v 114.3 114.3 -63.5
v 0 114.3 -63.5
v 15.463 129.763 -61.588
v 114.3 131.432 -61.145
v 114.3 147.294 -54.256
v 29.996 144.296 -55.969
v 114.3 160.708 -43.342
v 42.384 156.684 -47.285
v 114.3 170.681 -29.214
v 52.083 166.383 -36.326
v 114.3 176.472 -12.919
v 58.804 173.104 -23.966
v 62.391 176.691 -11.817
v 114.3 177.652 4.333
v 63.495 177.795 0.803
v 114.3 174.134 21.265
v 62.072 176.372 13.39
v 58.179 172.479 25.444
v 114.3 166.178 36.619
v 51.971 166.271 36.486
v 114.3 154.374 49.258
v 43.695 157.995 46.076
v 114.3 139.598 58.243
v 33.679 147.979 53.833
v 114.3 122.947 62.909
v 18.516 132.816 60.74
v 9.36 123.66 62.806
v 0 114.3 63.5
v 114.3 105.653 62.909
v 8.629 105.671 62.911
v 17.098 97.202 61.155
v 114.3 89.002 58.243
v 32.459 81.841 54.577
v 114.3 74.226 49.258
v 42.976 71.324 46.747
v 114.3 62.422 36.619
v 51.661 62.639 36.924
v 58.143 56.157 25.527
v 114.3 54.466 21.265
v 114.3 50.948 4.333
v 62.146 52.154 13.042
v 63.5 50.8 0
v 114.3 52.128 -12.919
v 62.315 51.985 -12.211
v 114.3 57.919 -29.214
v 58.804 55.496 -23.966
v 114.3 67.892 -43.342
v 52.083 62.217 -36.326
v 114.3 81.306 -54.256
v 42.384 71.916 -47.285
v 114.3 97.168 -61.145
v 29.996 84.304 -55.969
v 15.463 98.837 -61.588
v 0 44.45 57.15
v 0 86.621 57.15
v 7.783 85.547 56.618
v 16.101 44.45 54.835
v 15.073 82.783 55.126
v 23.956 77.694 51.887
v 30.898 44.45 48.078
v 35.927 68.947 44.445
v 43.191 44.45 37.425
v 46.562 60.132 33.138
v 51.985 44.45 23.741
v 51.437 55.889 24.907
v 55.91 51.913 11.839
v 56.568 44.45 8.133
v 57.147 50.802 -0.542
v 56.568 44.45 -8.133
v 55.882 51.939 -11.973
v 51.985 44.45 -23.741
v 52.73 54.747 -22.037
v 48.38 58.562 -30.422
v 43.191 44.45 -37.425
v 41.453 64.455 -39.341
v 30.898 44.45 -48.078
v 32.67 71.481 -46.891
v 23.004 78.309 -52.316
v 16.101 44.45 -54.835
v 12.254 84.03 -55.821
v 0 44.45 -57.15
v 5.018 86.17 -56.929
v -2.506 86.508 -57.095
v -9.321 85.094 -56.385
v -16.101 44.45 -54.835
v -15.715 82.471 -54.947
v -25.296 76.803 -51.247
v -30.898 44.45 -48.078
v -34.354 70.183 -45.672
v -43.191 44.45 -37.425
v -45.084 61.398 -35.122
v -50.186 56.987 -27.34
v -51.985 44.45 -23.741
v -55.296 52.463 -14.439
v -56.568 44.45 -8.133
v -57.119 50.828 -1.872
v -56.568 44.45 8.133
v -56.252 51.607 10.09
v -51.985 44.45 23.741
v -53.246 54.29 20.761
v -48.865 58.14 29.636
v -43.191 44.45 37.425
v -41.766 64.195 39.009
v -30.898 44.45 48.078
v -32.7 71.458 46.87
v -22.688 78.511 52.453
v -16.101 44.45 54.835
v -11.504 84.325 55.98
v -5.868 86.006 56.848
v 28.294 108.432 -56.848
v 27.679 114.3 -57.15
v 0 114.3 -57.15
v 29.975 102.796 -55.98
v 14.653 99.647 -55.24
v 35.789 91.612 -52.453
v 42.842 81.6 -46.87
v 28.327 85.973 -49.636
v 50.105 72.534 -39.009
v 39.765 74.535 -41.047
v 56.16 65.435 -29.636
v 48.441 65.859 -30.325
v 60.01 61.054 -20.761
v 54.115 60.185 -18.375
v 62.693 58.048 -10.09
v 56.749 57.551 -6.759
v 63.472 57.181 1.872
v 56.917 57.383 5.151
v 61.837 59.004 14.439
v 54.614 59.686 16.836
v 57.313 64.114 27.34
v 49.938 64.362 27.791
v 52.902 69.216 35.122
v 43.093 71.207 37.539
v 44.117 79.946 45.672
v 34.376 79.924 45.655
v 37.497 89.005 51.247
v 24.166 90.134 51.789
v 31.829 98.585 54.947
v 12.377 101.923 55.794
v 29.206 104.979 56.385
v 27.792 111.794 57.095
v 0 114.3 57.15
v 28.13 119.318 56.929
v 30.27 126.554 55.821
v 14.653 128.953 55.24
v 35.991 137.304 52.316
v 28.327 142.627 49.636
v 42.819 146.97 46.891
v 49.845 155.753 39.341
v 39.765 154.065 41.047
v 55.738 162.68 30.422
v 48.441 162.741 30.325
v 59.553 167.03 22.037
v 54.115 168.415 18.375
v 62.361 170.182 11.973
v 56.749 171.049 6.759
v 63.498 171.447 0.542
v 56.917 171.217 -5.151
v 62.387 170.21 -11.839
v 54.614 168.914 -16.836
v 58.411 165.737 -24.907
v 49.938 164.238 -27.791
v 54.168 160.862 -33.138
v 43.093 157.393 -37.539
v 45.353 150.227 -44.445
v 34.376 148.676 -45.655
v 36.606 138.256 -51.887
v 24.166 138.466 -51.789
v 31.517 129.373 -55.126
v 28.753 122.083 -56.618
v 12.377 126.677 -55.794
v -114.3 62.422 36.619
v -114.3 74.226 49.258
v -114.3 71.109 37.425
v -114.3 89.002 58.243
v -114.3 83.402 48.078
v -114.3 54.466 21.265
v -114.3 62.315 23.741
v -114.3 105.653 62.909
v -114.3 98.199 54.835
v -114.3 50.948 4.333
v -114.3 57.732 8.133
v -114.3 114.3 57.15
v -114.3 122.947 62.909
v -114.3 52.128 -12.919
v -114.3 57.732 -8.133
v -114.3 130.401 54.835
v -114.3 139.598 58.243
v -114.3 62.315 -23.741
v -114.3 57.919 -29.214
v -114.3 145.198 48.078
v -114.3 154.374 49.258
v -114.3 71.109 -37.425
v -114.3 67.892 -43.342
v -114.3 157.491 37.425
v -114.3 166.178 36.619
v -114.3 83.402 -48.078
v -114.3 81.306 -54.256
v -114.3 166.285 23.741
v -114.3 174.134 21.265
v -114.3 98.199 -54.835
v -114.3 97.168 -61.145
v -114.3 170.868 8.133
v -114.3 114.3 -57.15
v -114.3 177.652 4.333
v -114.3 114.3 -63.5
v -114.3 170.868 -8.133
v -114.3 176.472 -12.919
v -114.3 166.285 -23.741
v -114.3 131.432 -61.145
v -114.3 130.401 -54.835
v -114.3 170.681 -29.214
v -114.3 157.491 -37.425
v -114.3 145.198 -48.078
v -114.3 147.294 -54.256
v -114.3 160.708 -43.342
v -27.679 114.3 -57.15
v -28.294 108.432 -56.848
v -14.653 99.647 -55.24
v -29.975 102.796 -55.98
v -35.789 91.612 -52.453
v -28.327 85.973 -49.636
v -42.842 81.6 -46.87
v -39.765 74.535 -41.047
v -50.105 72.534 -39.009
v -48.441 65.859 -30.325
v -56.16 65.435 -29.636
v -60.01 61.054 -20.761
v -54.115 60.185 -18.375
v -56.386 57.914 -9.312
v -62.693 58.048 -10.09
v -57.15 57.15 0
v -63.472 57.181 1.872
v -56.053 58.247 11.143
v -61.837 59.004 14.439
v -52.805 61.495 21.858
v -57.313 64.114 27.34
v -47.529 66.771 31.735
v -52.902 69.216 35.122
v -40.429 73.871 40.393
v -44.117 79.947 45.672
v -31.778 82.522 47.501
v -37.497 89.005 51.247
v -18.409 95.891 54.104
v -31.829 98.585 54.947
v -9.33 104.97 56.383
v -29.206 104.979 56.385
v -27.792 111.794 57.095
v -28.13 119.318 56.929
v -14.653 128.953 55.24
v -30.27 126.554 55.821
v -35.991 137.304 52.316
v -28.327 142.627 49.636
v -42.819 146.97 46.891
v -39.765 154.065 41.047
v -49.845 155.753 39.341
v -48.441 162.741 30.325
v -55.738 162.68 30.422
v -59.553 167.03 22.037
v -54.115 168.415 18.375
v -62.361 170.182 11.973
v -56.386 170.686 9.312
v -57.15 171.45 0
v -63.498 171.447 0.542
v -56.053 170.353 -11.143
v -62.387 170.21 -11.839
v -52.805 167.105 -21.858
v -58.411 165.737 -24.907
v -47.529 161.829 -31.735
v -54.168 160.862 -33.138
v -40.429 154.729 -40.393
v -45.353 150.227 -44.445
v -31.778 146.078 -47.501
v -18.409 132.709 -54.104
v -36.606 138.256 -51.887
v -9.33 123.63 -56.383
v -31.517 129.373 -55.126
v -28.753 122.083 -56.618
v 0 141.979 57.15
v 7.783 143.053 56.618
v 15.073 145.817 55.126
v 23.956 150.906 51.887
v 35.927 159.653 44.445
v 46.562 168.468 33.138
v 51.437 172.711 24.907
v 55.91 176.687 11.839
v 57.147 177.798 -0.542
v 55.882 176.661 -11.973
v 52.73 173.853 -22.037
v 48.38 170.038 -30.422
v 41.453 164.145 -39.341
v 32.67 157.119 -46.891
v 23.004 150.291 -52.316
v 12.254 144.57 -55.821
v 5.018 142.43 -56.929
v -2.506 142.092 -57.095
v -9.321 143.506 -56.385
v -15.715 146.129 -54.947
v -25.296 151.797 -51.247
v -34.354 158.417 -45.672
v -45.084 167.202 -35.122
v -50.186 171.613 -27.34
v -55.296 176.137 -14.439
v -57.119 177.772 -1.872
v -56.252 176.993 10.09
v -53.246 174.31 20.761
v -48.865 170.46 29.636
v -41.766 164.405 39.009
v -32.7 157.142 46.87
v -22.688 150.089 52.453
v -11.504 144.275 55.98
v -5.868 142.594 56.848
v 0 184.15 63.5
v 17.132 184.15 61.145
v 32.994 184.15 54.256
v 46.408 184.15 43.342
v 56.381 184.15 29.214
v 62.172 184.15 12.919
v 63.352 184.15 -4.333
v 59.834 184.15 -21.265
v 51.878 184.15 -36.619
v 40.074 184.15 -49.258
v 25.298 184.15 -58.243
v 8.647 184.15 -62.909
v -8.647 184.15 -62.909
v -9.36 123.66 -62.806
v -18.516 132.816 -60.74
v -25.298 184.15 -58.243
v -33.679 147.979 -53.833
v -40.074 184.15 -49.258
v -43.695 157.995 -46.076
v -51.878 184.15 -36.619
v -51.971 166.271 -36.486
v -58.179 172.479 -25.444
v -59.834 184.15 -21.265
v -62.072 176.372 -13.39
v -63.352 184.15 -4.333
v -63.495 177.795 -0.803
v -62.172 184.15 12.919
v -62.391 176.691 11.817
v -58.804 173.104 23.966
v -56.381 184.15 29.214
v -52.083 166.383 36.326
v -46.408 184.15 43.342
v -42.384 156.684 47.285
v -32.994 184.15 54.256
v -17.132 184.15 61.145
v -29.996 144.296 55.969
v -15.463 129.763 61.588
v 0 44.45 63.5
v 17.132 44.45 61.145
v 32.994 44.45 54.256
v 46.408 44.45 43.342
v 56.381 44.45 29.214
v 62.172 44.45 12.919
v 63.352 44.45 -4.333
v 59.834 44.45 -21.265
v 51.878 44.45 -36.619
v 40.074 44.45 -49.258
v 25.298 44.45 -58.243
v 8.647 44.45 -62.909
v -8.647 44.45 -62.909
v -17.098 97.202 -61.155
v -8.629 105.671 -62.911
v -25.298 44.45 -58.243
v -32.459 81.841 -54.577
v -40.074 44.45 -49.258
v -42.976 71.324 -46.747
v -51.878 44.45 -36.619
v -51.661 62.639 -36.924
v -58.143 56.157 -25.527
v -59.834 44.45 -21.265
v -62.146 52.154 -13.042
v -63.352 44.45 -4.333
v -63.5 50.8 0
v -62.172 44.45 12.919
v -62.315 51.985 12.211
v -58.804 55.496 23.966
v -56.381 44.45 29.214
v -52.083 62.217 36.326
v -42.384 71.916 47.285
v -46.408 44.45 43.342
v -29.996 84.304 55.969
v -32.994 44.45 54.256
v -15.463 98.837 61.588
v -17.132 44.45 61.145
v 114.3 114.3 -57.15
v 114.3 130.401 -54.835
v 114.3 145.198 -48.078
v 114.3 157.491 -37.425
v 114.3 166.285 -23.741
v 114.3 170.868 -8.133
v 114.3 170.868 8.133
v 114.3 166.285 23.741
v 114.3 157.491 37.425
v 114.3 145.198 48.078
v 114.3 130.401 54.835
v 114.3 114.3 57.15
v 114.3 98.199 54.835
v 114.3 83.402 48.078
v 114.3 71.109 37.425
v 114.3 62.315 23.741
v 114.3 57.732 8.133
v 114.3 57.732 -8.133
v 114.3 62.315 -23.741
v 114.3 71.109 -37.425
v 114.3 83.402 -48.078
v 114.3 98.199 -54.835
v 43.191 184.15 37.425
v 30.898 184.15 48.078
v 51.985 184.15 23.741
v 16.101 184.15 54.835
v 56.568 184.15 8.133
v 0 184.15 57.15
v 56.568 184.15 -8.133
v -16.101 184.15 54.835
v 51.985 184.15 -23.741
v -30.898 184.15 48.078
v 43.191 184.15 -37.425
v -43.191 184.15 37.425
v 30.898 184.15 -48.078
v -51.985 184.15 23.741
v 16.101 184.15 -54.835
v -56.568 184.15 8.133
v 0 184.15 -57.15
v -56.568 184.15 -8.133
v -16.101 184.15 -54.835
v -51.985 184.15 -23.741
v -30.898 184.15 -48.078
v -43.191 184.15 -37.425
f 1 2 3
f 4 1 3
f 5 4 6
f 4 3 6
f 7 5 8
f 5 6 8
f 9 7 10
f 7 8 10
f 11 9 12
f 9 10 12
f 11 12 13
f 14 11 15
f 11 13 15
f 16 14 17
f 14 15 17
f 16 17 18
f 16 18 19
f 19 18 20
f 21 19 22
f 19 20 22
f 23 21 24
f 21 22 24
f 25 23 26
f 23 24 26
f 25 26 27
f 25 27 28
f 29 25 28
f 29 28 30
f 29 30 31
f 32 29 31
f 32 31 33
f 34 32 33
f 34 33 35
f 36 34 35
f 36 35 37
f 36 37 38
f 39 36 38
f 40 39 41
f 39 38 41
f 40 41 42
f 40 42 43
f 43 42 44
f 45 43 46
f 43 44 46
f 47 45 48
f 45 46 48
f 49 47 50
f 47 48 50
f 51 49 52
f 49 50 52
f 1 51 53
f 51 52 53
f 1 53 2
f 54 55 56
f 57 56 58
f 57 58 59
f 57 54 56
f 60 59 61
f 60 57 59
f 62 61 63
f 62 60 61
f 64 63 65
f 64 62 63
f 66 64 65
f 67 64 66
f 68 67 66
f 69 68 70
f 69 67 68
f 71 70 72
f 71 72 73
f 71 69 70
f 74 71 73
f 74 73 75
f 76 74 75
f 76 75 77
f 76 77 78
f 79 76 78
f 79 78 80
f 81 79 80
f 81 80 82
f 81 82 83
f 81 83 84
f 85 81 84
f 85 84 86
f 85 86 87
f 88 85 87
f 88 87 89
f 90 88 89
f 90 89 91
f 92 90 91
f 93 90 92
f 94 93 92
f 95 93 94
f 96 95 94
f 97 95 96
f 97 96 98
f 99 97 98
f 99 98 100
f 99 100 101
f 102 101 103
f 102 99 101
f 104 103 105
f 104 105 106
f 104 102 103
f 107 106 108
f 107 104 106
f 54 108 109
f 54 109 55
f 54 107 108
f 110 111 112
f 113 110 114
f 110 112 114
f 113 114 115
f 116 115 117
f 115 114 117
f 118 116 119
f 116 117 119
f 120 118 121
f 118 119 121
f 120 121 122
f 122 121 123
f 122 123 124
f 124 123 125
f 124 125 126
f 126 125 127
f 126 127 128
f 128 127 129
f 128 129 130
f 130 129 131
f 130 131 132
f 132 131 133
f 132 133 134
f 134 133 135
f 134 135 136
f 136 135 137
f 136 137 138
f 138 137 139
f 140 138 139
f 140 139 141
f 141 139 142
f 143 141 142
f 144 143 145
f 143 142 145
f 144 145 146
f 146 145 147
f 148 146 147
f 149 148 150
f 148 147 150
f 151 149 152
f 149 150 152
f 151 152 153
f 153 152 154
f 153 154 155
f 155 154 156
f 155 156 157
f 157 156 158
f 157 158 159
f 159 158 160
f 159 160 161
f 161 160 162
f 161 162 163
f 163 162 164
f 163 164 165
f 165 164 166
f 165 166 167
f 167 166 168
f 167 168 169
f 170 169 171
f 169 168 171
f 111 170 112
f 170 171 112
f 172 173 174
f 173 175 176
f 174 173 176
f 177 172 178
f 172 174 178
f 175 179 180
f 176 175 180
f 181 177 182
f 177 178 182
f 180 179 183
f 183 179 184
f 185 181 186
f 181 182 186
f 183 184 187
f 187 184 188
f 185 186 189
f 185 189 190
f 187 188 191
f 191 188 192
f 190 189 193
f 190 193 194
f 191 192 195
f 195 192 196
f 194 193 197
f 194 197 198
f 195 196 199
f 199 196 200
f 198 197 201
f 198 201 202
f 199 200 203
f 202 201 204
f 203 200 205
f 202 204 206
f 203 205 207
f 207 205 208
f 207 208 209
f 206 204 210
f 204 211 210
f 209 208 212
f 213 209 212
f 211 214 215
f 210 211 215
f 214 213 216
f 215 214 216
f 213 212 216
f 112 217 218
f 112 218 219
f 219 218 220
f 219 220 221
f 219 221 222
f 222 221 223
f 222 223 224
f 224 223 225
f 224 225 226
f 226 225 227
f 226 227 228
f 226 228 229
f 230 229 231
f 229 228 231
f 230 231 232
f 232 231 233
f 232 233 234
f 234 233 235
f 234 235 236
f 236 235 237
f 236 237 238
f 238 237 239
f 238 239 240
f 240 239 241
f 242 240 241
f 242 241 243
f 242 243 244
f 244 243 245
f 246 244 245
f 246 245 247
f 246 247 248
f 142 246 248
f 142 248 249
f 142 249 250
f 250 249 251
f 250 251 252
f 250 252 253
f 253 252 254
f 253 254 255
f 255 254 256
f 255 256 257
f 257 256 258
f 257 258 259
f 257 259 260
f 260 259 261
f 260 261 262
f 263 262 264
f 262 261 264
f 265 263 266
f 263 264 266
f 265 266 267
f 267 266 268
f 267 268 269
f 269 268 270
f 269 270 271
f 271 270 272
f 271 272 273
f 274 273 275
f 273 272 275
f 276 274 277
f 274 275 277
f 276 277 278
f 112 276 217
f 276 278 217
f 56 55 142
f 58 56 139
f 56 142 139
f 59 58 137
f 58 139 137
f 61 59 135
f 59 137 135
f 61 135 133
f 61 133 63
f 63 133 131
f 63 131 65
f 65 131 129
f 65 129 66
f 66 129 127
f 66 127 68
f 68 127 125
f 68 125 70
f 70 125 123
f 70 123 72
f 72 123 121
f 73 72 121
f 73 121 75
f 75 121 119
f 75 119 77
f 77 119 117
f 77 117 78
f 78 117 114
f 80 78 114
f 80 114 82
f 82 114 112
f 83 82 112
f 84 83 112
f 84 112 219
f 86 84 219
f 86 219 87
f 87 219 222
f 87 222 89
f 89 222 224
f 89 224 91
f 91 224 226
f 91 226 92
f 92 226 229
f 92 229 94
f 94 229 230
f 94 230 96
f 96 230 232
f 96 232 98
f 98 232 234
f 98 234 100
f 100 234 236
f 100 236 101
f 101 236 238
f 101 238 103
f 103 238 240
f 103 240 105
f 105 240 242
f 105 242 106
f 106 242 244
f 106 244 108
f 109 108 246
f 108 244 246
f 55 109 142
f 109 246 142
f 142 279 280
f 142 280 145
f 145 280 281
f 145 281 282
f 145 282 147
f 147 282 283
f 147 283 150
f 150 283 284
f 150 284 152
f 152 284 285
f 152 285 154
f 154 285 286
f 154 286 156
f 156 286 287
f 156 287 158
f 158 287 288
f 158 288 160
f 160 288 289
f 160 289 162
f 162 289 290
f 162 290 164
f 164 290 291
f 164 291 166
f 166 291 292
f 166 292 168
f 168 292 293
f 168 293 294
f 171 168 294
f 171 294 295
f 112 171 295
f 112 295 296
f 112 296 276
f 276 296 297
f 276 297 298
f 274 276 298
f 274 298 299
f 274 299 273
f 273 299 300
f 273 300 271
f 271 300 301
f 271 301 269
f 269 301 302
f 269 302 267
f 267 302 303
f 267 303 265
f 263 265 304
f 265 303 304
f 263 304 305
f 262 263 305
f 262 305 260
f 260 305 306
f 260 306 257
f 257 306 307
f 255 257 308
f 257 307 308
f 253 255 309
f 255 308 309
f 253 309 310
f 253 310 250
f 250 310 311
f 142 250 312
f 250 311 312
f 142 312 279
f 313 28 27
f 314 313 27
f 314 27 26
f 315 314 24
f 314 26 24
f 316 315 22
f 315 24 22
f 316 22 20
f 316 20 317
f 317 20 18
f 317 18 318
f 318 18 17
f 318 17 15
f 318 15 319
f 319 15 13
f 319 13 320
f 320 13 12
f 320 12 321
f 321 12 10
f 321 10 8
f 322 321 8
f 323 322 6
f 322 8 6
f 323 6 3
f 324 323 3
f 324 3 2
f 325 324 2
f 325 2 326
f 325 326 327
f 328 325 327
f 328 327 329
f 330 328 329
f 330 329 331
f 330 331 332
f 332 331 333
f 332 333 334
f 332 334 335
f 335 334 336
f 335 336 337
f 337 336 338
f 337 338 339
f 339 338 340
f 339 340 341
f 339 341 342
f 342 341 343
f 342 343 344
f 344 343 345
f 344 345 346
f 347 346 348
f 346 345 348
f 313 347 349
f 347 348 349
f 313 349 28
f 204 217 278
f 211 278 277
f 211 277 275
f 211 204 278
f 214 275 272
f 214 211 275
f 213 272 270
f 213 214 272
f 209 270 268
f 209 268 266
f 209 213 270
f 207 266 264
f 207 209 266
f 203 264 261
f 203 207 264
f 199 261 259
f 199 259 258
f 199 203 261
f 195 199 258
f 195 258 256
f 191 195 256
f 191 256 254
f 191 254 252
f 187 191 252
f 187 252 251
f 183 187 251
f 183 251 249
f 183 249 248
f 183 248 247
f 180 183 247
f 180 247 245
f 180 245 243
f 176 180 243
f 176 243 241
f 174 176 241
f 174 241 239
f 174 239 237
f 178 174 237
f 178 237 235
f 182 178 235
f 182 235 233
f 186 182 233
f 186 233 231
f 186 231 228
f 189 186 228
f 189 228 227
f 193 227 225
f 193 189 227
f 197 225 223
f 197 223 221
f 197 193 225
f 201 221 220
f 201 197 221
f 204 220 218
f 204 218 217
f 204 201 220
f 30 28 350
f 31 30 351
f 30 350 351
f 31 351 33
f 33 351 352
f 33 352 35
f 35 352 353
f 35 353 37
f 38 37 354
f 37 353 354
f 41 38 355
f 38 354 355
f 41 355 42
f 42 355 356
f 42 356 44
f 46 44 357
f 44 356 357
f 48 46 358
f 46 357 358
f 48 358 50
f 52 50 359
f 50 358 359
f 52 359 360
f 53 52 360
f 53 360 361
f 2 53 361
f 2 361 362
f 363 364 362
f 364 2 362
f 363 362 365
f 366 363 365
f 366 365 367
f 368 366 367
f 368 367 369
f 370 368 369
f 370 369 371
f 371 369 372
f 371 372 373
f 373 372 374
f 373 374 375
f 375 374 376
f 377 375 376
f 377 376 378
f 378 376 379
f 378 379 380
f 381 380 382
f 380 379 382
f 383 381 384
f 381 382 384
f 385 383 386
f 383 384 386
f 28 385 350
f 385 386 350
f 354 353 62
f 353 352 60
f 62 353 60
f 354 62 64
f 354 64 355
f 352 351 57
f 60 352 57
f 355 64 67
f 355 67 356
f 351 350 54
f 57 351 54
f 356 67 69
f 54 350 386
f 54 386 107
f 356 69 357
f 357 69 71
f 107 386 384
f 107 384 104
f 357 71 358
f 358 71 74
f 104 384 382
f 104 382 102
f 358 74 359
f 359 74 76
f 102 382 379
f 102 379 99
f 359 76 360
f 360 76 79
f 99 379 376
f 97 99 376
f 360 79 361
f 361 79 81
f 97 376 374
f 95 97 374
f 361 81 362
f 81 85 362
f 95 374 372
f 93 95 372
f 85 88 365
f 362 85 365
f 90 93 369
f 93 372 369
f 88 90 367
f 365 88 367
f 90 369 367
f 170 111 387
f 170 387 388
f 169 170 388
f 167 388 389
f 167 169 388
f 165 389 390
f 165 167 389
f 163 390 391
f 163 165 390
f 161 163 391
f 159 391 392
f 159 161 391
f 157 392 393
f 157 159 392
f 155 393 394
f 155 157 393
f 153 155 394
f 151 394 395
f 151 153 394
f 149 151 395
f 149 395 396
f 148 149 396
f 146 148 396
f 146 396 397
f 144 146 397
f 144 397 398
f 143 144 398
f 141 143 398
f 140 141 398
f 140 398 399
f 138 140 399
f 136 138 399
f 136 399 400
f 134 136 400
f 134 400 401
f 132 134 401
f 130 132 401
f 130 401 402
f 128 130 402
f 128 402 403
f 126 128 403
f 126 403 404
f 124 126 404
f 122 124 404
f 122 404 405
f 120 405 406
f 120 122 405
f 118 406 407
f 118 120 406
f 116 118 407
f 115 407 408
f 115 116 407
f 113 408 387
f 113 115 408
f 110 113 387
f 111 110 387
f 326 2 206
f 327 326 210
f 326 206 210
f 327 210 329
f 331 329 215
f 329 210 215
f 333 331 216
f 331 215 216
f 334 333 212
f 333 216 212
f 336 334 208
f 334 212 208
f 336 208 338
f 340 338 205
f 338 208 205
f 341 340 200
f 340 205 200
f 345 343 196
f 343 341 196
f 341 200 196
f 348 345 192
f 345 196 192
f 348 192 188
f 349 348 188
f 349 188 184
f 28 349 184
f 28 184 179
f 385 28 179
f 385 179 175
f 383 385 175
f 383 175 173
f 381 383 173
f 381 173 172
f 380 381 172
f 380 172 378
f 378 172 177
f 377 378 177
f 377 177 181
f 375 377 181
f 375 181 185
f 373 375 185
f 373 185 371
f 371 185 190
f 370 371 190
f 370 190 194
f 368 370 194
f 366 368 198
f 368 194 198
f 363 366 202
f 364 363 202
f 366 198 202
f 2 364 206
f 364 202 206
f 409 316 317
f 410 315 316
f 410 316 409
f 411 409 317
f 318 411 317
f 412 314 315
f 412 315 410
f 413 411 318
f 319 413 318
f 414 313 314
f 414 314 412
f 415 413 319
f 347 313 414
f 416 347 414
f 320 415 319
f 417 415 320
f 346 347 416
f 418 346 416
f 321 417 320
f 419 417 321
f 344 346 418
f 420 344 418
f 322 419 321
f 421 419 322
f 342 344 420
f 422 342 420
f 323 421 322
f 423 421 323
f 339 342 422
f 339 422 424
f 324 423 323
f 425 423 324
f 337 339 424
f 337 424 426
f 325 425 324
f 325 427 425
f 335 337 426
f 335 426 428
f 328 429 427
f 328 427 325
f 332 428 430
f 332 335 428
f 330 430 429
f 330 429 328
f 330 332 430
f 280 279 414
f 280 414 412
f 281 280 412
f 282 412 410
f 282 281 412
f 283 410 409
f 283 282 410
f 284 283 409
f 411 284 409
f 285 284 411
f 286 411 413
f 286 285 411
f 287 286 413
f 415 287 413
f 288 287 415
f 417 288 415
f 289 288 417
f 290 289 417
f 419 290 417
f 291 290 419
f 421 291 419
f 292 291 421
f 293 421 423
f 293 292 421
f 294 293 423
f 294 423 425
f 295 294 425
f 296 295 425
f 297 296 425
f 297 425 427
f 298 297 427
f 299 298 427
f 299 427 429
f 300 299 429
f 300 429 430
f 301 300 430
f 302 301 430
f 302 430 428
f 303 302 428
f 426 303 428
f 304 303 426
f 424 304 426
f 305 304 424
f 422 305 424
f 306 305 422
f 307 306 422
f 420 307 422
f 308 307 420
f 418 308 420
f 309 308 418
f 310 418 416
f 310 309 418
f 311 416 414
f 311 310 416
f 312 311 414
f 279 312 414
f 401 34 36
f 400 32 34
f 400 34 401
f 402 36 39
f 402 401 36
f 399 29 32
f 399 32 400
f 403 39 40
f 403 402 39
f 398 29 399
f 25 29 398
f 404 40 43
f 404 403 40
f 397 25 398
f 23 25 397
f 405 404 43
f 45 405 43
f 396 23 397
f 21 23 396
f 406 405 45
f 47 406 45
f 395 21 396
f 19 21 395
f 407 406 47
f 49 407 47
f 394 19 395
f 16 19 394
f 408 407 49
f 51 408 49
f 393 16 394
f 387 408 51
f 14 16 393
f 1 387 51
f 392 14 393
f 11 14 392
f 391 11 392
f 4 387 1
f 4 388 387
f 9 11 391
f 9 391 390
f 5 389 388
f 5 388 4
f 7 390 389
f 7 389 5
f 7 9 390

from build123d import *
from build123d.topology import SkipClean

# Parameters (mm, degrees)
SKETCH2_R                = 63.5
SKETCH2_R_2              = 57.15
BOSS_EXTRUDE1_DEPTH      = 228.6
BOSS_EXTRUDE2_DEPTH      = 114.3
BOSS_EXTRUDE2_DEPTH_BACK = 114.3
SKETCH3_R                = 63.5
SKETCH3_R_2              = 57.15
SKETCH4_R                = 57.15
CUT_EXTRUDE1_DEPTH       = 330.466493124
SKETCH5_R                = 57.15
CUT_EXTRUDE2_DEPTH       = 264.352805317
CUT_EXTRUDE3_DEPTH       = 264.352805317
CUT_EXTRUDE3_DEPTH_BACK  = 264.352805317
SKETCH6_W                = 187.910276351
SKETCH6_H                = 55.092106145
SKETCH6_W_2              = 179.956402219
SKETCH6_H_2              = 52.109403346


with BuildPart() as part:
    # Sketch2 → Boss-Extrude1 (new body)
    with BuildSketch(Plane(origin=(0, 0, 0), x_dir=(1, 0, 0), z_dir=(0, 1, 0))):
        Circle(SKETCH2_R)
        Circle(SKETCH2_R_2, mode=Mode.SUBTRACT)
    extrude(amount=BOSS_EXTRUDE1_DEPTH)

    # Sketch3 → Boss-Extrude2 (add, two sides: drawn at the far end of the back side and taken through both)
    with BuildSketch(Plane(origin=(0, 0, 0), x_dir=(0, 0, -1), z_dir=(1, 0, 0)).offset(-BOSS_EXTRUDE2_DEPTH_BACK)):
        with Locations((0, 114.3)):
            Circle(SKETCH3_R)
        with Locations((0, 114.3)):
            Circle(SKETCH3_R_2, mode=Mode.SUBTRACT)
    extrude(amount=BOSS_EXTRUDE2_DEPTH + BOSS_EXTRUDE2_DEPTH_BACK)

    # Sketch4 → Cut-Extrude1 (cut, through all)
    with BuildSketch(Plane.ZY.offset(114.3)):
        with Locations((0, 114.3)):
            Circle(SKETCH4_R)
    extrude(amount=-CUT_EXTRUDE1_DEPTH, mode=Mode.SUBTRACT)

    # Sketch5 → Cut-Extrude2 (cut, through all)
    with SkipClean():  # the faces are left unmerged after this step: merging them gives an invalid solid
        with BuildSketch(Plane(origin=(0, 228.6, 0), x_dir=(1, 0, 0), z_dir=(0, 1, 0))):
            Circle(SKETCH5_R)
        extrude(amount=-CUT_EXTRUDE2_DEPTH, mode=Mode.SUBTRACT)

    # Sketch6 → Cut-Extrude3 (cut, two sides: drawn at the far end of the back side and taken through both)
    with SkipClean():  # the faces are left unmerged after this step: merging them gives an invalid solid
        with BuildSketch(Plane(origin=(0, 0, 0), x_dir=(0, 0, -1), z_dir=(1, 0, 0)).offset(-CUT_EXTRUDE3_DEPTH_BACK)):
            with Locations((10.108048375, 211.696053073)):
                Rectangle(SKETCH6_W, SKETCH6_H)
            with Locations((6.131111309, 18.395298327)):
                Rectangle(SKETCH6_W_2, SKETCH6_H_2)
        extrude(amount=CUT_EXTRUDE3_DEPTH + CUT_EXTRUDE3_DEPTH_BACK, mode=Mode.SUBTRACT)


solid = part.part
